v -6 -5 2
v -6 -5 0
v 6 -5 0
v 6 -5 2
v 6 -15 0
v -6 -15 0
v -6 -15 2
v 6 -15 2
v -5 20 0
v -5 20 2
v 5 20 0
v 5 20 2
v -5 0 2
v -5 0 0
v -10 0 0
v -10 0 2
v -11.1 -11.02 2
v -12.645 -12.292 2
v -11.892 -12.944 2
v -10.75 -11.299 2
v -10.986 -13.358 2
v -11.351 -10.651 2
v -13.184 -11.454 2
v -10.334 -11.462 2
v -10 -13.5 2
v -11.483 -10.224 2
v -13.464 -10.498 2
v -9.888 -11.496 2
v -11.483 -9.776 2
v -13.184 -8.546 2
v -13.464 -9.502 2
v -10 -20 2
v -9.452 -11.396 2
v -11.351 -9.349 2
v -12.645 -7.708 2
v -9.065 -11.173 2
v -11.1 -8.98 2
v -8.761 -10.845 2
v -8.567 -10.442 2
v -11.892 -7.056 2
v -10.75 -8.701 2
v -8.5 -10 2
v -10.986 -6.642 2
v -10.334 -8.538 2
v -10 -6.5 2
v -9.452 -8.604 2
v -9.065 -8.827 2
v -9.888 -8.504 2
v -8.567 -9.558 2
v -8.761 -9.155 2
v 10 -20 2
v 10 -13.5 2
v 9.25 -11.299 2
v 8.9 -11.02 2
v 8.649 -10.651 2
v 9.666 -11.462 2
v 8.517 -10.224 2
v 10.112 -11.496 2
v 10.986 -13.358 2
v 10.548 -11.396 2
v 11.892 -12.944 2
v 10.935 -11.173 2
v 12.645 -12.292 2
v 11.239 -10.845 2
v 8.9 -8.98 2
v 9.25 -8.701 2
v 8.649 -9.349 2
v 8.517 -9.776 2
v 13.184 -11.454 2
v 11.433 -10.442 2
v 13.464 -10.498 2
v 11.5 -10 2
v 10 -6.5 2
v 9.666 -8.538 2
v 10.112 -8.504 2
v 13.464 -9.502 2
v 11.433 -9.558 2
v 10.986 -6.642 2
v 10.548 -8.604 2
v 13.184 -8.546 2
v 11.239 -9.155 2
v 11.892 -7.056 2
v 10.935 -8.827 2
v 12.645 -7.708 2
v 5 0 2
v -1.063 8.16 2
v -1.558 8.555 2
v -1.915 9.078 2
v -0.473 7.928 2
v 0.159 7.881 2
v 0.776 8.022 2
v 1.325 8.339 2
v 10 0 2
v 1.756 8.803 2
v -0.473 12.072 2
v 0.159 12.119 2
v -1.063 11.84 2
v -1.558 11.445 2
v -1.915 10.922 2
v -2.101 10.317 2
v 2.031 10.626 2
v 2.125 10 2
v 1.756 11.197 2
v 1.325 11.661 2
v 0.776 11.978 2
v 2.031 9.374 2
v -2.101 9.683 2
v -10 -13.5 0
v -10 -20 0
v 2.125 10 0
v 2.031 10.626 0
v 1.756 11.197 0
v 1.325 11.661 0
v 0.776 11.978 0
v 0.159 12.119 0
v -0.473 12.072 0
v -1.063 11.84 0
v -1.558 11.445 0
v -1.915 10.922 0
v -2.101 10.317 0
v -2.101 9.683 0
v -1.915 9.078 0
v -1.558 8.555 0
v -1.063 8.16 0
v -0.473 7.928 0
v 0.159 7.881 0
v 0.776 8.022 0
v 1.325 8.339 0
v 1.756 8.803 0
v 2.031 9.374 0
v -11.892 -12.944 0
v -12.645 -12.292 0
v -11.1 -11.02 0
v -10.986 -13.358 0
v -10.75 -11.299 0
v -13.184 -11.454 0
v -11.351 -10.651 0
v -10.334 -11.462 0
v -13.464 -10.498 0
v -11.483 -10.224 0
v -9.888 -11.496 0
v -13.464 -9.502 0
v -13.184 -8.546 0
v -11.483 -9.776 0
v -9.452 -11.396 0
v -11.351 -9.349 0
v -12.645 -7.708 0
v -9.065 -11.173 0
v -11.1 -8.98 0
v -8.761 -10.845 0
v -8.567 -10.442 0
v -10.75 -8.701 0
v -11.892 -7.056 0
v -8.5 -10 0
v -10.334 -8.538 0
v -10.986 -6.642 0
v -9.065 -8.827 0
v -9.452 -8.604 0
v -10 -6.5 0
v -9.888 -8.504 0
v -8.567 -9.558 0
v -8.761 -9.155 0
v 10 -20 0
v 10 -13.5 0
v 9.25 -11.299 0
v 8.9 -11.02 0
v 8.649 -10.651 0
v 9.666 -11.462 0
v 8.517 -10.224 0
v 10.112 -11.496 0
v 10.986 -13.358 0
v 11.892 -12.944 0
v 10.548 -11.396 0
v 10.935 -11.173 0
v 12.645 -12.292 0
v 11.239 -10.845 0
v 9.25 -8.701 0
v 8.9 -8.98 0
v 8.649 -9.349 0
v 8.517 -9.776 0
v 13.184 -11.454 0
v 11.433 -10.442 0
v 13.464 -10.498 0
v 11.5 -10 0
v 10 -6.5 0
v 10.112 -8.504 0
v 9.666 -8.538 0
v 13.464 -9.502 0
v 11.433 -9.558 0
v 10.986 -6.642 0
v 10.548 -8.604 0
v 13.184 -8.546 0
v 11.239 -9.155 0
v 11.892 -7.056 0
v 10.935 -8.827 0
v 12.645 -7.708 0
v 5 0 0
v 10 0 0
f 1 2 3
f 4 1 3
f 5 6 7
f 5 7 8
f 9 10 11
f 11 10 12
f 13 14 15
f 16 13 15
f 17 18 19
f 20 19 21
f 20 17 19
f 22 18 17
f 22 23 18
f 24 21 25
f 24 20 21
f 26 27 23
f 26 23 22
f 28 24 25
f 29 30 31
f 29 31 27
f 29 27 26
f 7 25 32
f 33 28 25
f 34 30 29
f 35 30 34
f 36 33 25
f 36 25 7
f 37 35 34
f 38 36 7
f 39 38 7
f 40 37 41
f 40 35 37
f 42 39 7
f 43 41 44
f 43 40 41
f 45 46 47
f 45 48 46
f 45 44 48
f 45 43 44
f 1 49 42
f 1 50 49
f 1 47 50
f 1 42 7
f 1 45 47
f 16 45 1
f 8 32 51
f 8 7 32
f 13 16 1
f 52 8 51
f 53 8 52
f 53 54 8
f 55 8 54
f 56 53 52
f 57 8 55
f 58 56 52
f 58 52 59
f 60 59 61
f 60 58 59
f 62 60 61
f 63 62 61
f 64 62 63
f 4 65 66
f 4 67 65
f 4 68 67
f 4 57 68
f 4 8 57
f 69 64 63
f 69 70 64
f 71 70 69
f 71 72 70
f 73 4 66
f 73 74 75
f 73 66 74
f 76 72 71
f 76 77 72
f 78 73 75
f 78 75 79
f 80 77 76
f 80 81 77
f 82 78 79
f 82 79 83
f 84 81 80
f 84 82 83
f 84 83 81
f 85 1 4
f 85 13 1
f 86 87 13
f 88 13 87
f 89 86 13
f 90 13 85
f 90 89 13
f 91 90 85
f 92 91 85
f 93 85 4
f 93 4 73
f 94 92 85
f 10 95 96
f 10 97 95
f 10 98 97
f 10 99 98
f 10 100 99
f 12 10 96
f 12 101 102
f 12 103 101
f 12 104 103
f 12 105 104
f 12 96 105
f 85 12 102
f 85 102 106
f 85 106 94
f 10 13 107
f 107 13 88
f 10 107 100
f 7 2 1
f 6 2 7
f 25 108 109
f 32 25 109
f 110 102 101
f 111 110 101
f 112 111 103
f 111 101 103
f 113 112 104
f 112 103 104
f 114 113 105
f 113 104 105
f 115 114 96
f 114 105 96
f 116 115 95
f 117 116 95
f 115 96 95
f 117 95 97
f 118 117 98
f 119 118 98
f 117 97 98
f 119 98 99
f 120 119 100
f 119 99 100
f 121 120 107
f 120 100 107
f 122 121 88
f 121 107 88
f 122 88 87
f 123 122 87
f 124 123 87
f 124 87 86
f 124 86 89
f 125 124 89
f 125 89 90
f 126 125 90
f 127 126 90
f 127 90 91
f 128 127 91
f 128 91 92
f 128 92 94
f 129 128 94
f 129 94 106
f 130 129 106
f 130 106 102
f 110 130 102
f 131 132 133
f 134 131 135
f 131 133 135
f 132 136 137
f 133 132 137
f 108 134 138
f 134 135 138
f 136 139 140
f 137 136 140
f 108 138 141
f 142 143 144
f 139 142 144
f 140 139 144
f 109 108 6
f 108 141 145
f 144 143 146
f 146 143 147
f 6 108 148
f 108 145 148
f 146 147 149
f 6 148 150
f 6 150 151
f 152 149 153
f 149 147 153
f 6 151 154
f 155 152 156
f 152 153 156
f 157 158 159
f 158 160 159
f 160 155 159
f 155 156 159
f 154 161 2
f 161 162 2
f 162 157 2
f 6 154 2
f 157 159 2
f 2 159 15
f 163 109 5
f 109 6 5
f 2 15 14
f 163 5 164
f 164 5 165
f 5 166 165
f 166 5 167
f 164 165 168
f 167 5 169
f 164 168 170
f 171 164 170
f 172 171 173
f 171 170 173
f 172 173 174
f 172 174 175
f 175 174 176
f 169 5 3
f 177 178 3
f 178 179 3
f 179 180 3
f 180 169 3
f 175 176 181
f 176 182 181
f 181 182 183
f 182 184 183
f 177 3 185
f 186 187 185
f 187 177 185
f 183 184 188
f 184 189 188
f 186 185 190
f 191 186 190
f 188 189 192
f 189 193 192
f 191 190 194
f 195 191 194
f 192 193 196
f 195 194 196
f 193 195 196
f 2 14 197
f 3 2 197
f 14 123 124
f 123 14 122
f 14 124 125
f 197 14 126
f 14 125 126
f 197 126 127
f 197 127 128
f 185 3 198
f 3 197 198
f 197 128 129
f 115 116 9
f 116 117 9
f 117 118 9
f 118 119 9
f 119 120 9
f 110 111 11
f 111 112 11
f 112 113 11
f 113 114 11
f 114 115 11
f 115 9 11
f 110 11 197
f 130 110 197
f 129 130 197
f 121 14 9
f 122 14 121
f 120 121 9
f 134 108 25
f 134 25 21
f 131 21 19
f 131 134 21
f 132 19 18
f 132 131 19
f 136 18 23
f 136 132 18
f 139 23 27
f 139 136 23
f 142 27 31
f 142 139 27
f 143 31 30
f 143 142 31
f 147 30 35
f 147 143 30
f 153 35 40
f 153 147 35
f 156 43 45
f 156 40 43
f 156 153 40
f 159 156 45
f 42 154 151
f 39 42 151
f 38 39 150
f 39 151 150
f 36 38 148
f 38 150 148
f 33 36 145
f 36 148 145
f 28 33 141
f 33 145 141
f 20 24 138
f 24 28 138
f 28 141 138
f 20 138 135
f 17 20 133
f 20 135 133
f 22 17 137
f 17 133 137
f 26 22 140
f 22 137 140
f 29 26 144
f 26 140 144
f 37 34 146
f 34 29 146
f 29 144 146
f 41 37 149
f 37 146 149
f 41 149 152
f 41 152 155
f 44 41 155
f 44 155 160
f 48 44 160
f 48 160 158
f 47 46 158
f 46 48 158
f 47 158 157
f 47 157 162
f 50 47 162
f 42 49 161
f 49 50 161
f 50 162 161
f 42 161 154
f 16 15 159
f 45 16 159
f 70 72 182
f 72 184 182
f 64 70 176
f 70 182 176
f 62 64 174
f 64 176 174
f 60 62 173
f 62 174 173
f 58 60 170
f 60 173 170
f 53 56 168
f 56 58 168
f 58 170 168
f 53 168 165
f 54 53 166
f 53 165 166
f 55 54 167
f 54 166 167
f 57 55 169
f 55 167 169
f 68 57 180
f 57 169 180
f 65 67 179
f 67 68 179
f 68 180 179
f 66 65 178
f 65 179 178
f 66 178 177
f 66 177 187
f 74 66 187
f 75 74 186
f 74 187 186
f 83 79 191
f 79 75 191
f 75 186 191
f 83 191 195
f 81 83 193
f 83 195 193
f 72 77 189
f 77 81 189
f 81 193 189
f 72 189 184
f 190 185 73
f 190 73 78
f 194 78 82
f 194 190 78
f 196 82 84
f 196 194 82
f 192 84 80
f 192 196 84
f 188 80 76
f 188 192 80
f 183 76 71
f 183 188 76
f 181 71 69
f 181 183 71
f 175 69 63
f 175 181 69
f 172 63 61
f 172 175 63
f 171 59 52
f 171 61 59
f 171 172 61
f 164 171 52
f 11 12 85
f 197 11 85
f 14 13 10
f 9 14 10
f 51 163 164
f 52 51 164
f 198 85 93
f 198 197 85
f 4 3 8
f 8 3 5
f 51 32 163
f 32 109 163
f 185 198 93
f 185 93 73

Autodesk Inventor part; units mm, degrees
ref_plane "YZ Plane" through (0, 0, 0) normal (1, 0, 0) x (0, 1, 0)
ref_plane "XZ Plane" through (0, 0, 0) normal (0, 1, 0) x (-1, 0, 0)
ref_plane "XY Plane" through (0, 0, 0) normal (0, 0, 1) x (1, 0, 0)
sketch "Sketch1" plane through (0, 0, 0) normal (0, 0, 1) x (1, 0, 0)
  line L0 (0, 0) -> (10, 0)
  line L1 (0, 0) -> (-10, 0)
  line L2 (-10, 0) -> (-10, -6.5)
  line L3 (10, 0) -> (10, -6.5)
  line L4 (-10, 0) -> (10, 0)
  line L5 (-10, -20) -> (10, -20)
  line L6 (-10, -6.5) -> (-10, -5)
  line L7 (-6, -5) -> (6, -5)
  line L8 (-6, -15) -> (6, -15)
  line L9 (6, -5) -> (6, -15)
  line L10 (-6, -5) -> (-6, -15)
  line L11 (-10, 0) -> (-10, -6.5)
  line L12 (-10, -13.5) -> (-10, -20)
  line L13 (10, -20) -> (10, -13.5)
  line L14 (10, -6.5) -> (10, 0)
  circle A0 centre (10, -10) radius 1.5
  arc A1 (10, -13.5) -> (10, -6.5) centre (10, -10) ccw
  circle A2 centre (-10, -10) radius 1.5
  arc A3 (-10, -6.5) -> (-10, -13.5) centre (-10, -10) ccw
  dimension "d0" = 10
  dimension "d1" = 10
  dimension "d2" = 20
  dimension "d7" = 3
  dimension "d8" = 7
  dimension "d9" = 3
  dimension "d10" = 7
extrude "Extrusion1" add sketch "Sketch1" along normal blind 2
thread "Thread2" size "M3x0.5" class "6H" standard "ANSI Metric M Profile" full length
thread "Thread3" size "M3x0.5" class "6H" standard "ANSI Metric M Profile" full length
sketch "Sketch6" plane through (0, 0, 2) normal (0, 0, 1) x (1, 0, 0)
  line L0 (10, 0) -> (-10, 0) projected
  line L1 (-5, 0) -> (-5, 20)
  line L2 (-5, 0) -> (15, 0) construction
  line L3 (-5, 20) -> (5, 20)
  line L4 (5, 20) -> (5, 0)
  arc A0 (-10, -6.5) -> (-10, -13.5) centre (-10, -10) ccw projected
  arc A1 (10, -13.5) -> (10, -6.5) centre (10, -10) ccw projected
  line L5 (-13.5, -10) -> (13.5, -10)
  circle A2 centre (0, 10) radius 2.125
  point P0 (0, 0)
  dimension "d45" = 20
  dimension "d47" = 10
  dimension "d59" = 4.25
extrude "Extrusion7" add sketch "Sketch6" against normal blind 2
properties part number "Time of Flight Attachment 2.0"
